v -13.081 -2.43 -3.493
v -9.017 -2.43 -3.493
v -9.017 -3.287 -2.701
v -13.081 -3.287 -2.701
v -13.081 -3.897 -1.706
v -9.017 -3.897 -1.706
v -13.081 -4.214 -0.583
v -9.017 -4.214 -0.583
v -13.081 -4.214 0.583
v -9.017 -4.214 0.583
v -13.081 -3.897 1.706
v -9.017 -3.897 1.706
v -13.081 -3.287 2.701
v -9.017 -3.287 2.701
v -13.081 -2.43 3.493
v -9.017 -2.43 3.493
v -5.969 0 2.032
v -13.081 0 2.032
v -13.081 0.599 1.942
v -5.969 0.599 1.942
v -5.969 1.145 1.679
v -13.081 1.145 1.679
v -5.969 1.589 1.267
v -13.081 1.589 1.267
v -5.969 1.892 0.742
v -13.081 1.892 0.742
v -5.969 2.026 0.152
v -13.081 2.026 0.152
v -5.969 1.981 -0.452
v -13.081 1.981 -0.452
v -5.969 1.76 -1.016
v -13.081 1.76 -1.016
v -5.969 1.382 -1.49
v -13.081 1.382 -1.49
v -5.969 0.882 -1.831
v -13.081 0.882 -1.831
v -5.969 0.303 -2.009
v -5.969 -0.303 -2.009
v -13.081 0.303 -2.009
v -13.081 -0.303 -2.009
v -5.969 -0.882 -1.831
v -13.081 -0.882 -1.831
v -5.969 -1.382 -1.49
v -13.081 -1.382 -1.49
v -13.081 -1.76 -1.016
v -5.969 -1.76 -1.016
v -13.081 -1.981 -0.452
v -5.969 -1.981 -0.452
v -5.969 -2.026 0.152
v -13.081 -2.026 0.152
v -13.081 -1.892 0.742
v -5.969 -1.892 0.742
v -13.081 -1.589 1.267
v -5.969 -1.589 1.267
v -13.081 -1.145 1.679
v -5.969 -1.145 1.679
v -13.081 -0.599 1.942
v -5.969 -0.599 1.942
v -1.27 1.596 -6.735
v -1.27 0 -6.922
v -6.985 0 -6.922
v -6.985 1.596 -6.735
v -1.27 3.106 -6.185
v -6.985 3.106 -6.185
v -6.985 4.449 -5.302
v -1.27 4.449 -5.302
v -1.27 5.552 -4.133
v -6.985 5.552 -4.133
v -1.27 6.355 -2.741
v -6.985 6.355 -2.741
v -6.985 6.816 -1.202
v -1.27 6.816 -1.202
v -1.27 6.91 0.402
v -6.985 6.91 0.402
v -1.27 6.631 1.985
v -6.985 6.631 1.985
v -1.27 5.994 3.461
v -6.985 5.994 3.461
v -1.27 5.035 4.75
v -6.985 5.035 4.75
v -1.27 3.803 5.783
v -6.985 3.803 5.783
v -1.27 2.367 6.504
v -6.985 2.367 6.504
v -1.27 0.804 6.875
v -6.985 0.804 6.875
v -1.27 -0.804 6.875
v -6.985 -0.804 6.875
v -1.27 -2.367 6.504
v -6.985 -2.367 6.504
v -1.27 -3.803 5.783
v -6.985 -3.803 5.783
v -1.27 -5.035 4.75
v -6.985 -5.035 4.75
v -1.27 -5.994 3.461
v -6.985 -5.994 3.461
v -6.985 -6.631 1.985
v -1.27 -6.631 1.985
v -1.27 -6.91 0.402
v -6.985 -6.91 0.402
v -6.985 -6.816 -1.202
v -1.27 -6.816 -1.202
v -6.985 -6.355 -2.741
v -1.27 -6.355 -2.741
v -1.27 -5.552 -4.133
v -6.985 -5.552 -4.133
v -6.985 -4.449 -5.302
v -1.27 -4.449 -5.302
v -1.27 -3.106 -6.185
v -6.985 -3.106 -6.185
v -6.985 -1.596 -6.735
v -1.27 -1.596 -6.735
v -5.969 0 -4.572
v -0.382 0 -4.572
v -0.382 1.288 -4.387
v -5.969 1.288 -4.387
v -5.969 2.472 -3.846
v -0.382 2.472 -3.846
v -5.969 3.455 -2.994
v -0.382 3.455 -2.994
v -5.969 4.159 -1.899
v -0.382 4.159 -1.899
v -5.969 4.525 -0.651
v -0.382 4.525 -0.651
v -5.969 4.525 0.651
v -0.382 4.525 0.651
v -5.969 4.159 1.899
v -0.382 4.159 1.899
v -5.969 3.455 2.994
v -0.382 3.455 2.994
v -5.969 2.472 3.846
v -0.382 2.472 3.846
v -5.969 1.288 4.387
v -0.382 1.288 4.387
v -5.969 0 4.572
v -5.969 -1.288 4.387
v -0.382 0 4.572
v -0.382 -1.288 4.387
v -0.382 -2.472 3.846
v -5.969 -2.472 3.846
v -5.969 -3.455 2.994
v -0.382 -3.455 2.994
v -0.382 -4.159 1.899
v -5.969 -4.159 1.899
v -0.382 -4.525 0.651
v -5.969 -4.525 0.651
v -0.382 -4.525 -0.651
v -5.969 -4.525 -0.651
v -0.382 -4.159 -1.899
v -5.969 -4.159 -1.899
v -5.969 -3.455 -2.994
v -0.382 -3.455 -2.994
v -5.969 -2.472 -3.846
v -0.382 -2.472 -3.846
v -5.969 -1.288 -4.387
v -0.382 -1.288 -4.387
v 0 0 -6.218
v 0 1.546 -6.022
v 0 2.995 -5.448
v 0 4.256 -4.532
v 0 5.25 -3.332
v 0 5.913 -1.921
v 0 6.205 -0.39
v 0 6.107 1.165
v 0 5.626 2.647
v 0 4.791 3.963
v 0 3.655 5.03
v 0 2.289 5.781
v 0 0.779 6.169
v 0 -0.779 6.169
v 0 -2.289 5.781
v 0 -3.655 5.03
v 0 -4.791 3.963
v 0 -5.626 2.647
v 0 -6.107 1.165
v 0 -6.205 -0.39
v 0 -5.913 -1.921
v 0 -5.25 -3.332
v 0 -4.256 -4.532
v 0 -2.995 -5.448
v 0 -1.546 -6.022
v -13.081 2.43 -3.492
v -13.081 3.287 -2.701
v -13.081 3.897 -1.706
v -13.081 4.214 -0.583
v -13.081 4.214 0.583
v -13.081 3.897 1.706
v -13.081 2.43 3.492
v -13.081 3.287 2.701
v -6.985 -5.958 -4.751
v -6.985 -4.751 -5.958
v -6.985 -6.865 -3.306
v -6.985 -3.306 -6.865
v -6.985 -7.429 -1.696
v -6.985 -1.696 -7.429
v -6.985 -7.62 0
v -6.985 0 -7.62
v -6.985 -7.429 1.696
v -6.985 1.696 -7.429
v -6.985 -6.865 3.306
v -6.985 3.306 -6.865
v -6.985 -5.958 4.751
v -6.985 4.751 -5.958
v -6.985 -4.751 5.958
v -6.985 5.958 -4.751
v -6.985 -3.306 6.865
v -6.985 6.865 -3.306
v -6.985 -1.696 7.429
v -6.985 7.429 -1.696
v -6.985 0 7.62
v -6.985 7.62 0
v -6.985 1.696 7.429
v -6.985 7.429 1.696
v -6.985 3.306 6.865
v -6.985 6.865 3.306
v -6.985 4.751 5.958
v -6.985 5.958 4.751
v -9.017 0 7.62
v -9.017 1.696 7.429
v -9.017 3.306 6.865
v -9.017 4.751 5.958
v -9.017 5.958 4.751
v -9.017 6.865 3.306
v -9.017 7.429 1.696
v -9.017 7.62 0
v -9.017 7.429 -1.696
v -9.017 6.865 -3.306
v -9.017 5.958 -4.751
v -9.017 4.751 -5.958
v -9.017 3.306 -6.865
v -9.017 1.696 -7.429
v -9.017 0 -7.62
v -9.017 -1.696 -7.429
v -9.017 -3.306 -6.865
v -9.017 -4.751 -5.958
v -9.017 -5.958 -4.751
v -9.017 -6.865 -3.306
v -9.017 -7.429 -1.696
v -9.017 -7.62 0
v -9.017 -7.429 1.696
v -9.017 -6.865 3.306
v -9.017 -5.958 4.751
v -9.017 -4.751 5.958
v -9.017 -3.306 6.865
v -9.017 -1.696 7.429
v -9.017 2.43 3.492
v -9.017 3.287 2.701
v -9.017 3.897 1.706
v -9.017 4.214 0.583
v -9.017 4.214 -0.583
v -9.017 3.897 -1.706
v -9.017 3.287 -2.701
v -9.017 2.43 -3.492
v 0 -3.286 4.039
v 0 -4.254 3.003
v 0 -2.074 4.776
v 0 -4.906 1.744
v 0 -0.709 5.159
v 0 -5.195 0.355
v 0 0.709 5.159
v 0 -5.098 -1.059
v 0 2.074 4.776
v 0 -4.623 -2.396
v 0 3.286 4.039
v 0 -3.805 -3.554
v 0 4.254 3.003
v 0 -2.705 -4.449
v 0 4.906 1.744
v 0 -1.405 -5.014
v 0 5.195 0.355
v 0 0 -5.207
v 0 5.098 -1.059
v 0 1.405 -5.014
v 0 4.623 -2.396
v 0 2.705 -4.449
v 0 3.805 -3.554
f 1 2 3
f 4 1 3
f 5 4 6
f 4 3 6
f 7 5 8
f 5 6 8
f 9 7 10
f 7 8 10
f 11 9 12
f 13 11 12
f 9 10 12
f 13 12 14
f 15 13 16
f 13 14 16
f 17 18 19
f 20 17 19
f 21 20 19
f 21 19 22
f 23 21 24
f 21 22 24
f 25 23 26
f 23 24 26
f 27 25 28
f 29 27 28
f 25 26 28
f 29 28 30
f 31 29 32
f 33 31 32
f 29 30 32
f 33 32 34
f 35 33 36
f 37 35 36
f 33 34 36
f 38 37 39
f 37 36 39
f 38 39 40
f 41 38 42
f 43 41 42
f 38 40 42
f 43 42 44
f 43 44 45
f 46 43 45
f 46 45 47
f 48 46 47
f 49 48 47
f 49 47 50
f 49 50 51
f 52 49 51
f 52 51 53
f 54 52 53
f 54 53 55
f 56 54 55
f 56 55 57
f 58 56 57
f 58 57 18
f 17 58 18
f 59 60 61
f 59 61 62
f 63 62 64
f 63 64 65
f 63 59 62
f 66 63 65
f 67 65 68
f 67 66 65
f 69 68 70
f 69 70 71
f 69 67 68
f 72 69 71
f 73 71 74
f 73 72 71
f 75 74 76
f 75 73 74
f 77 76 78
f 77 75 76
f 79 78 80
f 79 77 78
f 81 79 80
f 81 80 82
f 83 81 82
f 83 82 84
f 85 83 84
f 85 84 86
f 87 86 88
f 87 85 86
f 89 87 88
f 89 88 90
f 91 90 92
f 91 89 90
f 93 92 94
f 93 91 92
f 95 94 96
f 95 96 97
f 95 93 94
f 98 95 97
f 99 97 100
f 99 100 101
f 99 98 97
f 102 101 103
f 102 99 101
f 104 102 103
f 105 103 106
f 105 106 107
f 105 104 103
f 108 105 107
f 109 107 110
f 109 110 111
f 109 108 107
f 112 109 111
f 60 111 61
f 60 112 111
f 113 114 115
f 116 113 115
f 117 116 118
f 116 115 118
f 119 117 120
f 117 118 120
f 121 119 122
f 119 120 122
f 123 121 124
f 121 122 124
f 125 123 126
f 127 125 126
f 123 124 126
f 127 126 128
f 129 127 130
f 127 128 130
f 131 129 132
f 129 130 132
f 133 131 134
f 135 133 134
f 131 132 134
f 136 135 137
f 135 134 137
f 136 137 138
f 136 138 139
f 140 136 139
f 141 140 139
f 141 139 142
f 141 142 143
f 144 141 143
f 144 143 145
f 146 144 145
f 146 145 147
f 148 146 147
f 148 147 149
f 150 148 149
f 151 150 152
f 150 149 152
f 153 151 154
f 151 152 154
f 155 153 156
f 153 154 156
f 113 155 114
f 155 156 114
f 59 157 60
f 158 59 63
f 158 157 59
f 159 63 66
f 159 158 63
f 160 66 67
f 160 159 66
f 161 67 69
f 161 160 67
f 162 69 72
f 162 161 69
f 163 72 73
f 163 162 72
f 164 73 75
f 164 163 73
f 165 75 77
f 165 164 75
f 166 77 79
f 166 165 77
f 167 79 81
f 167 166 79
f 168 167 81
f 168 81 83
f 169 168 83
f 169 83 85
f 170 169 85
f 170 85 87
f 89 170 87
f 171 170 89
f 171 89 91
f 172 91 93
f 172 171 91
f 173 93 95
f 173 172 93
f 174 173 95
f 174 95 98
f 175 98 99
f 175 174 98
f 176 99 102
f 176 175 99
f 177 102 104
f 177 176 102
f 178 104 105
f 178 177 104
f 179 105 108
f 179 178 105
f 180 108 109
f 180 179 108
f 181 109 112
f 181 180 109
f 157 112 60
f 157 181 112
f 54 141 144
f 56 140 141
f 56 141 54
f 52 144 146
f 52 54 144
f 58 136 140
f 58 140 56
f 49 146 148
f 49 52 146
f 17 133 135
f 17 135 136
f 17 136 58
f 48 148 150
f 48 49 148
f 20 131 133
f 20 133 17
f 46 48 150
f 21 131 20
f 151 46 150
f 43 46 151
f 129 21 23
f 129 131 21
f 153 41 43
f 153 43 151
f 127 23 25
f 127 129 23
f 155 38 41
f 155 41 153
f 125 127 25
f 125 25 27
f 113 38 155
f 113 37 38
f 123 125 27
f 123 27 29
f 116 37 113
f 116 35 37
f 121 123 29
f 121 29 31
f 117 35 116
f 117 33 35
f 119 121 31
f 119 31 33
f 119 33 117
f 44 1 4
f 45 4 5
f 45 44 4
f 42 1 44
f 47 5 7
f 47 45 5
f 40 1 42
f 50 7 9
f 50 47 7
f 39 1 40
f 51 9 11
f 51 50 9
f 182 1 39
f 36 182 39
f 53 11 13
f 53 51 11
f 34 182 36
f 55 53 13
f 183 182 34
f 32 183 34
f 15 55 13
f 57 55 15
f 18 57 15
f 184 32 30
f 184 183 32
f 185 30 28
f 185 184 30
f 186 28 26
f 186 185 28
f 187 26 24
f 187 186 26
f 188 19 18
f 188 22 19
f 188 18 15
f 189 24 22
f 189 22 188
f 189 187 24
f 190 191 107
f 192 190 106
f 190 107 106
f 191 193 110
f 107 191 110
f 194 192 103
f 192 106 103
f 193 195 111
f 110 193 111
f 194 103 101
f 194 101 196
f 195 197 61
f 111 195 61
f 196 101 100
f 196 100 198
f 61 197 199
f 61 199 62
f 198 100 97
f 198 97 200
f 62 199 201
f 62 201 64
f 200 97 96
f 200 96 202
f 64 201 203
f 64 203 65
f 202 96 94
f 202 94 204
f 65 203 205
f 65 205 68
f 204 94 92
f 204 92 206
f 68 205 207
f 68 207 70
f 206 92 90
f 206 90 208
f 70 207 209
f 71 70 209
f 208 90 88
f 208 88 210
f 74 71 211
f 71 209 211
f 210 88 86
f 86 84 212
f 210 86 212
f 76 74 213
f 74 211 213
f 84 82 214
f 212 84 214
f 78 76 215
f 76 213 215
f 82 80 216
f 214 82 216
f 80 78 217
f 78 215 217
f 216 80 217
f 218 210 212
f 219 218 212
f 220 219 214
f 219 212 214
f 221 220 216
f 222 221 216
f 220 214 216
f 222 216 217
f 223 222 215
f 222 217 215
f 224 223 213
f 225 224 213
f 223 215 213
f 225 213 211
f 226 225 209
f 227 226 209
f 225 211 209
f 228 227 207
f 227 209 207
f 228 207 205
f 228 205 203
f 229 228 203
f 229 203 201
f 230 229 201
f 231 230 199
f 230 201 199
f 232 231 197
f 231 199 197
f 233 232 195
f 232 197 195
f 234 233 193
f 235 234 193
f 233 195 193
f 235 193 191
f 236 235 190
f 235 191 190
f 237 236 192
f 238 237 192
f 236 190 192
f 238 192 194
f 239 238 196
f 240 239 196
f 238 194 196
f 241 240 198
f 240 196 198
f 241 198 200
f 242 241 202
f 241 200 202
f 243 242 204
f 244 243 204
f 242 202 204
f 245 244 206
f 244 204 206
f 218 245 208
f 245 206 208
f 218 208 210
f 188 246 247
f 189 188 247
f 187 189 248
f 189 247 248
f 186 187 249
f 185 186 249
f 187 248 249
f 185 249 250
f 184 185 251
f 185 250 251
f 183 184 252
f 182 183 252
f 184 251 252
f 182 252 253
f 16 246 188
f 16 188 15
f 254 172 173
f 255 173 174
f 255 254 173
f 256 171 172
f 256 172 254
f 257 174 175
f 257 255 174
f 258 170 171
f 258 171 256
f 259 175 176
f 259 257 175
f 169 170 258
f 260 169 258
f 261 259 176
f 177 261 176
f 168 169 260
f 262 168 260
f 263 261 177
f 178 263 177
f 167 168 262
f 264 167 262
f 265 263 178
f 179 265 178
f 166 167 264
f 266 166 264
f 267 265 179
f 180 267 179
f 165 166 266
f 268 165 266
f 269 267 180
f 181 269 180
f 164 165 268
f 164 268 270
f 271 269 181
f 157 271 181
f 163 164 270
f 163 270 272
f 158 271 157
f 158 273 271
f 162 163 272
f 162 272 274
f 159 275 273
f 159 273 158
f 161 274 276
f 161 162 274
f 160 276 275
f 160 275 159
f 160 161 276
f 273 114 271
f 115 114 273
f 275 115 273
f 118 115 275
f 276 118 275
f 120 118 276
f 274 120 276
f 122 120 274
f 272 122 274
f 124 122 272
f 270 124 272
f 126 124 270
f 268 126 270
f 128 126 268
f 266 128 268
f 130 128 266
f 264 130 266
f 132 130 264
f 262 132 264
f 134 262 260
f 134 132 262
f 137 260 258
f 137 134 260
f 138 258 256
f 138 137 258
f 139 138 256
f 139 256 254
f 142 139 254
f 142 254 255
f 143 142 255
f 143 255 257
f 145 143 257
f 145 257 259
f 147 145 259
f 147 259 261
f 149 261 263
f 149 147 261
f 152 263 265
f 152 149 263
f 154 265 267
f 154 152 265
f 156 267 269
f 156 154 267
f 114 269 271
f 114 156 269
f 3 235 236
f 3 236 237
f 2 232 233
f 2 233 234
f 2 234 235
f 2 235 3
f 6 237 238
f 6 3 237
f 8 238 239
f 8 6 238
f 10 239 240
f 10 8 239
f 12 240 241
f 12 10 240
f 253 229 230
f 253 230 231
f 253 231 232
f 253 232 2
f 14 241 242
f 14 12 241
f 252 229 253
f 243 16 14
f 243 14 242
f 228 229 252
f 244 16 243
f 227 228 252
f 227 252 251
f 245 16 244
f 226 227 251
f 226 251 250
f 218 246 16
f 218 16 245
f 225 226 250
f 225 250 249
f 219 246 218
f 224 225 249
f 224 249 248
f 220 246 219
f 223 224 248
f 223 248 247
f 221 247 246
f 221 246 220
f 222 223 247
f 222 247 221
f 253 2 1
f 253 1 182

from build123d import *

# Parameters (mm, degrees)
SKETCH1_R           = 6.9215
BOSS_EXTRUDE1_DEPTH = 6.985
SKETCH2_R           = 7.62
BOSS_EXTRUDE2_DEPTH = 2.032
SKETCH3_R           = 4.2545
BOSS_EXTRUDE3_DEPTH = 4.064
CUT_EXTRUDE1_START  = -4.064
CUT_EXTRUDE1_DEPTH  = 4.064
SKETCH5_R           = 2.032
CUT_EXTRUDE2_DEPTH  = 17.948196394
SKETCH6_R           = 4.572
CUT_EXTRUDE3_DEPTH  = 5.969
CHAMFER1_SIZE       = 1.27
CHAMFER1_SIZE2      = 0.703972495
CHAMFER2_SIZE       = 0.635
CHAMFER2_SIZE2      = 0.381546493


with BuildPart() as part:
    # Sketch1 → Boss-Extrude1 (new body)
    with BuildSketch(Plane(origin=(0, 0, 0), x_dir=(0, 0, -1), z_dir=(1, 0, 0))):
        Circle(SKETCH1_R)
    extrude(amount=-BOSS_EXTRUDE1_DEPTH)

    # Sketch2 → Boss-Extrude2 (add)
    with BuildSketch(Plane.ZY.offset(6.985)):
        Circle(SKETCH2_R)
    extrude(amount=BOSS_EXTRUDE2_DEPTH)

    # Sketch3 → Boss-Extrude3 (add)
    with BuildSketch(Plane.ZY.offset(9.017)):
        Circle(SKETCH3_R)
    extrude(amount=BOSS_EXTRUDE3_DEPTH)

    # Sketch4 → Cut-Extrude1 (cut)
    with BuildSketch(Plane.ZY.offset(13.081).offset(CUT_EXTRUDE1_START)):
        with BuildLine():
            Line((-3.4925, -2.429653062), (-3.4925, 2.429653062))
            ThreePointArc((-3.4925, 2.429653062), (-4.2545, 0), (-3.4925, -2.429653062))
        make_face()
        with BuildLine():
            ThreePointArc((4.2545, 0), (4.059532701, 1.273171041), (3.4925, 2.429653062))
            Line((3.4925, 2.429653062), (3.4925, -2.429653062))
            ThreePointArc((3.4925, -2.429653062), (4.059532701, -1.273171041), (4.2545, 0))
        make_face()
    extrude(amount=CUT_EXTRUDE1_DEPTH, mode=Mode.SUBTRACT)

    # Sketch5 → Cut-Extrude2 (cut, through all)
    with BuildSketch(Plane.ZY.offset(13.081)):
        Circle(SKETCH5_R)
    extrude(amount=-CUT_EXTRUDE2_DEPTH, mode=Mode.SUBTRACT)

    # Sketch6 → Cut-Extrude3 (cut)
    with BuildSketch(Plane(origin=(0, 0, 0), x_dir=(0, 0, -1), z_dir=(1, 0, 0))):
        Circle(SKETCH6_R)
    extrude(amount=-CUT_EXTRUDE3_DEPTH, mode=Mode.SUBTRACT)

    # Chamfer1
    chamfer1_edges = [part.edges().sort_by_distance(p)[0] for p in [
        (0, 0, 6.9215),
    ]]
    chamfer1_side = [part.faces().sort_by_distance(p)[0] for p in [
        (-3.4925, 0, 6.9215),
    ]]
    chamfer(chamfer1_edges, length=CHAMFER1_SIZE, length2=CHAMFER1_SIZE2, reference=chamfer1_side[0])

    # Chamfer2
    chamfer2_edges = [part.edges().sort_by_distance(p)[0] for p in [
        (0, 0, 4.572),
    ]]
    chamfer2_side = [part.faces().sort_by_distance(p)[0] for p in [
        (0, 0, 6.04166927),
    ]]
    chamfer(chamfer2_edges, length=CHAMFER2_SIZE, length2=CHAMFER2_SIZE2, reference=chamfer2_side[0])


solid = part.part
